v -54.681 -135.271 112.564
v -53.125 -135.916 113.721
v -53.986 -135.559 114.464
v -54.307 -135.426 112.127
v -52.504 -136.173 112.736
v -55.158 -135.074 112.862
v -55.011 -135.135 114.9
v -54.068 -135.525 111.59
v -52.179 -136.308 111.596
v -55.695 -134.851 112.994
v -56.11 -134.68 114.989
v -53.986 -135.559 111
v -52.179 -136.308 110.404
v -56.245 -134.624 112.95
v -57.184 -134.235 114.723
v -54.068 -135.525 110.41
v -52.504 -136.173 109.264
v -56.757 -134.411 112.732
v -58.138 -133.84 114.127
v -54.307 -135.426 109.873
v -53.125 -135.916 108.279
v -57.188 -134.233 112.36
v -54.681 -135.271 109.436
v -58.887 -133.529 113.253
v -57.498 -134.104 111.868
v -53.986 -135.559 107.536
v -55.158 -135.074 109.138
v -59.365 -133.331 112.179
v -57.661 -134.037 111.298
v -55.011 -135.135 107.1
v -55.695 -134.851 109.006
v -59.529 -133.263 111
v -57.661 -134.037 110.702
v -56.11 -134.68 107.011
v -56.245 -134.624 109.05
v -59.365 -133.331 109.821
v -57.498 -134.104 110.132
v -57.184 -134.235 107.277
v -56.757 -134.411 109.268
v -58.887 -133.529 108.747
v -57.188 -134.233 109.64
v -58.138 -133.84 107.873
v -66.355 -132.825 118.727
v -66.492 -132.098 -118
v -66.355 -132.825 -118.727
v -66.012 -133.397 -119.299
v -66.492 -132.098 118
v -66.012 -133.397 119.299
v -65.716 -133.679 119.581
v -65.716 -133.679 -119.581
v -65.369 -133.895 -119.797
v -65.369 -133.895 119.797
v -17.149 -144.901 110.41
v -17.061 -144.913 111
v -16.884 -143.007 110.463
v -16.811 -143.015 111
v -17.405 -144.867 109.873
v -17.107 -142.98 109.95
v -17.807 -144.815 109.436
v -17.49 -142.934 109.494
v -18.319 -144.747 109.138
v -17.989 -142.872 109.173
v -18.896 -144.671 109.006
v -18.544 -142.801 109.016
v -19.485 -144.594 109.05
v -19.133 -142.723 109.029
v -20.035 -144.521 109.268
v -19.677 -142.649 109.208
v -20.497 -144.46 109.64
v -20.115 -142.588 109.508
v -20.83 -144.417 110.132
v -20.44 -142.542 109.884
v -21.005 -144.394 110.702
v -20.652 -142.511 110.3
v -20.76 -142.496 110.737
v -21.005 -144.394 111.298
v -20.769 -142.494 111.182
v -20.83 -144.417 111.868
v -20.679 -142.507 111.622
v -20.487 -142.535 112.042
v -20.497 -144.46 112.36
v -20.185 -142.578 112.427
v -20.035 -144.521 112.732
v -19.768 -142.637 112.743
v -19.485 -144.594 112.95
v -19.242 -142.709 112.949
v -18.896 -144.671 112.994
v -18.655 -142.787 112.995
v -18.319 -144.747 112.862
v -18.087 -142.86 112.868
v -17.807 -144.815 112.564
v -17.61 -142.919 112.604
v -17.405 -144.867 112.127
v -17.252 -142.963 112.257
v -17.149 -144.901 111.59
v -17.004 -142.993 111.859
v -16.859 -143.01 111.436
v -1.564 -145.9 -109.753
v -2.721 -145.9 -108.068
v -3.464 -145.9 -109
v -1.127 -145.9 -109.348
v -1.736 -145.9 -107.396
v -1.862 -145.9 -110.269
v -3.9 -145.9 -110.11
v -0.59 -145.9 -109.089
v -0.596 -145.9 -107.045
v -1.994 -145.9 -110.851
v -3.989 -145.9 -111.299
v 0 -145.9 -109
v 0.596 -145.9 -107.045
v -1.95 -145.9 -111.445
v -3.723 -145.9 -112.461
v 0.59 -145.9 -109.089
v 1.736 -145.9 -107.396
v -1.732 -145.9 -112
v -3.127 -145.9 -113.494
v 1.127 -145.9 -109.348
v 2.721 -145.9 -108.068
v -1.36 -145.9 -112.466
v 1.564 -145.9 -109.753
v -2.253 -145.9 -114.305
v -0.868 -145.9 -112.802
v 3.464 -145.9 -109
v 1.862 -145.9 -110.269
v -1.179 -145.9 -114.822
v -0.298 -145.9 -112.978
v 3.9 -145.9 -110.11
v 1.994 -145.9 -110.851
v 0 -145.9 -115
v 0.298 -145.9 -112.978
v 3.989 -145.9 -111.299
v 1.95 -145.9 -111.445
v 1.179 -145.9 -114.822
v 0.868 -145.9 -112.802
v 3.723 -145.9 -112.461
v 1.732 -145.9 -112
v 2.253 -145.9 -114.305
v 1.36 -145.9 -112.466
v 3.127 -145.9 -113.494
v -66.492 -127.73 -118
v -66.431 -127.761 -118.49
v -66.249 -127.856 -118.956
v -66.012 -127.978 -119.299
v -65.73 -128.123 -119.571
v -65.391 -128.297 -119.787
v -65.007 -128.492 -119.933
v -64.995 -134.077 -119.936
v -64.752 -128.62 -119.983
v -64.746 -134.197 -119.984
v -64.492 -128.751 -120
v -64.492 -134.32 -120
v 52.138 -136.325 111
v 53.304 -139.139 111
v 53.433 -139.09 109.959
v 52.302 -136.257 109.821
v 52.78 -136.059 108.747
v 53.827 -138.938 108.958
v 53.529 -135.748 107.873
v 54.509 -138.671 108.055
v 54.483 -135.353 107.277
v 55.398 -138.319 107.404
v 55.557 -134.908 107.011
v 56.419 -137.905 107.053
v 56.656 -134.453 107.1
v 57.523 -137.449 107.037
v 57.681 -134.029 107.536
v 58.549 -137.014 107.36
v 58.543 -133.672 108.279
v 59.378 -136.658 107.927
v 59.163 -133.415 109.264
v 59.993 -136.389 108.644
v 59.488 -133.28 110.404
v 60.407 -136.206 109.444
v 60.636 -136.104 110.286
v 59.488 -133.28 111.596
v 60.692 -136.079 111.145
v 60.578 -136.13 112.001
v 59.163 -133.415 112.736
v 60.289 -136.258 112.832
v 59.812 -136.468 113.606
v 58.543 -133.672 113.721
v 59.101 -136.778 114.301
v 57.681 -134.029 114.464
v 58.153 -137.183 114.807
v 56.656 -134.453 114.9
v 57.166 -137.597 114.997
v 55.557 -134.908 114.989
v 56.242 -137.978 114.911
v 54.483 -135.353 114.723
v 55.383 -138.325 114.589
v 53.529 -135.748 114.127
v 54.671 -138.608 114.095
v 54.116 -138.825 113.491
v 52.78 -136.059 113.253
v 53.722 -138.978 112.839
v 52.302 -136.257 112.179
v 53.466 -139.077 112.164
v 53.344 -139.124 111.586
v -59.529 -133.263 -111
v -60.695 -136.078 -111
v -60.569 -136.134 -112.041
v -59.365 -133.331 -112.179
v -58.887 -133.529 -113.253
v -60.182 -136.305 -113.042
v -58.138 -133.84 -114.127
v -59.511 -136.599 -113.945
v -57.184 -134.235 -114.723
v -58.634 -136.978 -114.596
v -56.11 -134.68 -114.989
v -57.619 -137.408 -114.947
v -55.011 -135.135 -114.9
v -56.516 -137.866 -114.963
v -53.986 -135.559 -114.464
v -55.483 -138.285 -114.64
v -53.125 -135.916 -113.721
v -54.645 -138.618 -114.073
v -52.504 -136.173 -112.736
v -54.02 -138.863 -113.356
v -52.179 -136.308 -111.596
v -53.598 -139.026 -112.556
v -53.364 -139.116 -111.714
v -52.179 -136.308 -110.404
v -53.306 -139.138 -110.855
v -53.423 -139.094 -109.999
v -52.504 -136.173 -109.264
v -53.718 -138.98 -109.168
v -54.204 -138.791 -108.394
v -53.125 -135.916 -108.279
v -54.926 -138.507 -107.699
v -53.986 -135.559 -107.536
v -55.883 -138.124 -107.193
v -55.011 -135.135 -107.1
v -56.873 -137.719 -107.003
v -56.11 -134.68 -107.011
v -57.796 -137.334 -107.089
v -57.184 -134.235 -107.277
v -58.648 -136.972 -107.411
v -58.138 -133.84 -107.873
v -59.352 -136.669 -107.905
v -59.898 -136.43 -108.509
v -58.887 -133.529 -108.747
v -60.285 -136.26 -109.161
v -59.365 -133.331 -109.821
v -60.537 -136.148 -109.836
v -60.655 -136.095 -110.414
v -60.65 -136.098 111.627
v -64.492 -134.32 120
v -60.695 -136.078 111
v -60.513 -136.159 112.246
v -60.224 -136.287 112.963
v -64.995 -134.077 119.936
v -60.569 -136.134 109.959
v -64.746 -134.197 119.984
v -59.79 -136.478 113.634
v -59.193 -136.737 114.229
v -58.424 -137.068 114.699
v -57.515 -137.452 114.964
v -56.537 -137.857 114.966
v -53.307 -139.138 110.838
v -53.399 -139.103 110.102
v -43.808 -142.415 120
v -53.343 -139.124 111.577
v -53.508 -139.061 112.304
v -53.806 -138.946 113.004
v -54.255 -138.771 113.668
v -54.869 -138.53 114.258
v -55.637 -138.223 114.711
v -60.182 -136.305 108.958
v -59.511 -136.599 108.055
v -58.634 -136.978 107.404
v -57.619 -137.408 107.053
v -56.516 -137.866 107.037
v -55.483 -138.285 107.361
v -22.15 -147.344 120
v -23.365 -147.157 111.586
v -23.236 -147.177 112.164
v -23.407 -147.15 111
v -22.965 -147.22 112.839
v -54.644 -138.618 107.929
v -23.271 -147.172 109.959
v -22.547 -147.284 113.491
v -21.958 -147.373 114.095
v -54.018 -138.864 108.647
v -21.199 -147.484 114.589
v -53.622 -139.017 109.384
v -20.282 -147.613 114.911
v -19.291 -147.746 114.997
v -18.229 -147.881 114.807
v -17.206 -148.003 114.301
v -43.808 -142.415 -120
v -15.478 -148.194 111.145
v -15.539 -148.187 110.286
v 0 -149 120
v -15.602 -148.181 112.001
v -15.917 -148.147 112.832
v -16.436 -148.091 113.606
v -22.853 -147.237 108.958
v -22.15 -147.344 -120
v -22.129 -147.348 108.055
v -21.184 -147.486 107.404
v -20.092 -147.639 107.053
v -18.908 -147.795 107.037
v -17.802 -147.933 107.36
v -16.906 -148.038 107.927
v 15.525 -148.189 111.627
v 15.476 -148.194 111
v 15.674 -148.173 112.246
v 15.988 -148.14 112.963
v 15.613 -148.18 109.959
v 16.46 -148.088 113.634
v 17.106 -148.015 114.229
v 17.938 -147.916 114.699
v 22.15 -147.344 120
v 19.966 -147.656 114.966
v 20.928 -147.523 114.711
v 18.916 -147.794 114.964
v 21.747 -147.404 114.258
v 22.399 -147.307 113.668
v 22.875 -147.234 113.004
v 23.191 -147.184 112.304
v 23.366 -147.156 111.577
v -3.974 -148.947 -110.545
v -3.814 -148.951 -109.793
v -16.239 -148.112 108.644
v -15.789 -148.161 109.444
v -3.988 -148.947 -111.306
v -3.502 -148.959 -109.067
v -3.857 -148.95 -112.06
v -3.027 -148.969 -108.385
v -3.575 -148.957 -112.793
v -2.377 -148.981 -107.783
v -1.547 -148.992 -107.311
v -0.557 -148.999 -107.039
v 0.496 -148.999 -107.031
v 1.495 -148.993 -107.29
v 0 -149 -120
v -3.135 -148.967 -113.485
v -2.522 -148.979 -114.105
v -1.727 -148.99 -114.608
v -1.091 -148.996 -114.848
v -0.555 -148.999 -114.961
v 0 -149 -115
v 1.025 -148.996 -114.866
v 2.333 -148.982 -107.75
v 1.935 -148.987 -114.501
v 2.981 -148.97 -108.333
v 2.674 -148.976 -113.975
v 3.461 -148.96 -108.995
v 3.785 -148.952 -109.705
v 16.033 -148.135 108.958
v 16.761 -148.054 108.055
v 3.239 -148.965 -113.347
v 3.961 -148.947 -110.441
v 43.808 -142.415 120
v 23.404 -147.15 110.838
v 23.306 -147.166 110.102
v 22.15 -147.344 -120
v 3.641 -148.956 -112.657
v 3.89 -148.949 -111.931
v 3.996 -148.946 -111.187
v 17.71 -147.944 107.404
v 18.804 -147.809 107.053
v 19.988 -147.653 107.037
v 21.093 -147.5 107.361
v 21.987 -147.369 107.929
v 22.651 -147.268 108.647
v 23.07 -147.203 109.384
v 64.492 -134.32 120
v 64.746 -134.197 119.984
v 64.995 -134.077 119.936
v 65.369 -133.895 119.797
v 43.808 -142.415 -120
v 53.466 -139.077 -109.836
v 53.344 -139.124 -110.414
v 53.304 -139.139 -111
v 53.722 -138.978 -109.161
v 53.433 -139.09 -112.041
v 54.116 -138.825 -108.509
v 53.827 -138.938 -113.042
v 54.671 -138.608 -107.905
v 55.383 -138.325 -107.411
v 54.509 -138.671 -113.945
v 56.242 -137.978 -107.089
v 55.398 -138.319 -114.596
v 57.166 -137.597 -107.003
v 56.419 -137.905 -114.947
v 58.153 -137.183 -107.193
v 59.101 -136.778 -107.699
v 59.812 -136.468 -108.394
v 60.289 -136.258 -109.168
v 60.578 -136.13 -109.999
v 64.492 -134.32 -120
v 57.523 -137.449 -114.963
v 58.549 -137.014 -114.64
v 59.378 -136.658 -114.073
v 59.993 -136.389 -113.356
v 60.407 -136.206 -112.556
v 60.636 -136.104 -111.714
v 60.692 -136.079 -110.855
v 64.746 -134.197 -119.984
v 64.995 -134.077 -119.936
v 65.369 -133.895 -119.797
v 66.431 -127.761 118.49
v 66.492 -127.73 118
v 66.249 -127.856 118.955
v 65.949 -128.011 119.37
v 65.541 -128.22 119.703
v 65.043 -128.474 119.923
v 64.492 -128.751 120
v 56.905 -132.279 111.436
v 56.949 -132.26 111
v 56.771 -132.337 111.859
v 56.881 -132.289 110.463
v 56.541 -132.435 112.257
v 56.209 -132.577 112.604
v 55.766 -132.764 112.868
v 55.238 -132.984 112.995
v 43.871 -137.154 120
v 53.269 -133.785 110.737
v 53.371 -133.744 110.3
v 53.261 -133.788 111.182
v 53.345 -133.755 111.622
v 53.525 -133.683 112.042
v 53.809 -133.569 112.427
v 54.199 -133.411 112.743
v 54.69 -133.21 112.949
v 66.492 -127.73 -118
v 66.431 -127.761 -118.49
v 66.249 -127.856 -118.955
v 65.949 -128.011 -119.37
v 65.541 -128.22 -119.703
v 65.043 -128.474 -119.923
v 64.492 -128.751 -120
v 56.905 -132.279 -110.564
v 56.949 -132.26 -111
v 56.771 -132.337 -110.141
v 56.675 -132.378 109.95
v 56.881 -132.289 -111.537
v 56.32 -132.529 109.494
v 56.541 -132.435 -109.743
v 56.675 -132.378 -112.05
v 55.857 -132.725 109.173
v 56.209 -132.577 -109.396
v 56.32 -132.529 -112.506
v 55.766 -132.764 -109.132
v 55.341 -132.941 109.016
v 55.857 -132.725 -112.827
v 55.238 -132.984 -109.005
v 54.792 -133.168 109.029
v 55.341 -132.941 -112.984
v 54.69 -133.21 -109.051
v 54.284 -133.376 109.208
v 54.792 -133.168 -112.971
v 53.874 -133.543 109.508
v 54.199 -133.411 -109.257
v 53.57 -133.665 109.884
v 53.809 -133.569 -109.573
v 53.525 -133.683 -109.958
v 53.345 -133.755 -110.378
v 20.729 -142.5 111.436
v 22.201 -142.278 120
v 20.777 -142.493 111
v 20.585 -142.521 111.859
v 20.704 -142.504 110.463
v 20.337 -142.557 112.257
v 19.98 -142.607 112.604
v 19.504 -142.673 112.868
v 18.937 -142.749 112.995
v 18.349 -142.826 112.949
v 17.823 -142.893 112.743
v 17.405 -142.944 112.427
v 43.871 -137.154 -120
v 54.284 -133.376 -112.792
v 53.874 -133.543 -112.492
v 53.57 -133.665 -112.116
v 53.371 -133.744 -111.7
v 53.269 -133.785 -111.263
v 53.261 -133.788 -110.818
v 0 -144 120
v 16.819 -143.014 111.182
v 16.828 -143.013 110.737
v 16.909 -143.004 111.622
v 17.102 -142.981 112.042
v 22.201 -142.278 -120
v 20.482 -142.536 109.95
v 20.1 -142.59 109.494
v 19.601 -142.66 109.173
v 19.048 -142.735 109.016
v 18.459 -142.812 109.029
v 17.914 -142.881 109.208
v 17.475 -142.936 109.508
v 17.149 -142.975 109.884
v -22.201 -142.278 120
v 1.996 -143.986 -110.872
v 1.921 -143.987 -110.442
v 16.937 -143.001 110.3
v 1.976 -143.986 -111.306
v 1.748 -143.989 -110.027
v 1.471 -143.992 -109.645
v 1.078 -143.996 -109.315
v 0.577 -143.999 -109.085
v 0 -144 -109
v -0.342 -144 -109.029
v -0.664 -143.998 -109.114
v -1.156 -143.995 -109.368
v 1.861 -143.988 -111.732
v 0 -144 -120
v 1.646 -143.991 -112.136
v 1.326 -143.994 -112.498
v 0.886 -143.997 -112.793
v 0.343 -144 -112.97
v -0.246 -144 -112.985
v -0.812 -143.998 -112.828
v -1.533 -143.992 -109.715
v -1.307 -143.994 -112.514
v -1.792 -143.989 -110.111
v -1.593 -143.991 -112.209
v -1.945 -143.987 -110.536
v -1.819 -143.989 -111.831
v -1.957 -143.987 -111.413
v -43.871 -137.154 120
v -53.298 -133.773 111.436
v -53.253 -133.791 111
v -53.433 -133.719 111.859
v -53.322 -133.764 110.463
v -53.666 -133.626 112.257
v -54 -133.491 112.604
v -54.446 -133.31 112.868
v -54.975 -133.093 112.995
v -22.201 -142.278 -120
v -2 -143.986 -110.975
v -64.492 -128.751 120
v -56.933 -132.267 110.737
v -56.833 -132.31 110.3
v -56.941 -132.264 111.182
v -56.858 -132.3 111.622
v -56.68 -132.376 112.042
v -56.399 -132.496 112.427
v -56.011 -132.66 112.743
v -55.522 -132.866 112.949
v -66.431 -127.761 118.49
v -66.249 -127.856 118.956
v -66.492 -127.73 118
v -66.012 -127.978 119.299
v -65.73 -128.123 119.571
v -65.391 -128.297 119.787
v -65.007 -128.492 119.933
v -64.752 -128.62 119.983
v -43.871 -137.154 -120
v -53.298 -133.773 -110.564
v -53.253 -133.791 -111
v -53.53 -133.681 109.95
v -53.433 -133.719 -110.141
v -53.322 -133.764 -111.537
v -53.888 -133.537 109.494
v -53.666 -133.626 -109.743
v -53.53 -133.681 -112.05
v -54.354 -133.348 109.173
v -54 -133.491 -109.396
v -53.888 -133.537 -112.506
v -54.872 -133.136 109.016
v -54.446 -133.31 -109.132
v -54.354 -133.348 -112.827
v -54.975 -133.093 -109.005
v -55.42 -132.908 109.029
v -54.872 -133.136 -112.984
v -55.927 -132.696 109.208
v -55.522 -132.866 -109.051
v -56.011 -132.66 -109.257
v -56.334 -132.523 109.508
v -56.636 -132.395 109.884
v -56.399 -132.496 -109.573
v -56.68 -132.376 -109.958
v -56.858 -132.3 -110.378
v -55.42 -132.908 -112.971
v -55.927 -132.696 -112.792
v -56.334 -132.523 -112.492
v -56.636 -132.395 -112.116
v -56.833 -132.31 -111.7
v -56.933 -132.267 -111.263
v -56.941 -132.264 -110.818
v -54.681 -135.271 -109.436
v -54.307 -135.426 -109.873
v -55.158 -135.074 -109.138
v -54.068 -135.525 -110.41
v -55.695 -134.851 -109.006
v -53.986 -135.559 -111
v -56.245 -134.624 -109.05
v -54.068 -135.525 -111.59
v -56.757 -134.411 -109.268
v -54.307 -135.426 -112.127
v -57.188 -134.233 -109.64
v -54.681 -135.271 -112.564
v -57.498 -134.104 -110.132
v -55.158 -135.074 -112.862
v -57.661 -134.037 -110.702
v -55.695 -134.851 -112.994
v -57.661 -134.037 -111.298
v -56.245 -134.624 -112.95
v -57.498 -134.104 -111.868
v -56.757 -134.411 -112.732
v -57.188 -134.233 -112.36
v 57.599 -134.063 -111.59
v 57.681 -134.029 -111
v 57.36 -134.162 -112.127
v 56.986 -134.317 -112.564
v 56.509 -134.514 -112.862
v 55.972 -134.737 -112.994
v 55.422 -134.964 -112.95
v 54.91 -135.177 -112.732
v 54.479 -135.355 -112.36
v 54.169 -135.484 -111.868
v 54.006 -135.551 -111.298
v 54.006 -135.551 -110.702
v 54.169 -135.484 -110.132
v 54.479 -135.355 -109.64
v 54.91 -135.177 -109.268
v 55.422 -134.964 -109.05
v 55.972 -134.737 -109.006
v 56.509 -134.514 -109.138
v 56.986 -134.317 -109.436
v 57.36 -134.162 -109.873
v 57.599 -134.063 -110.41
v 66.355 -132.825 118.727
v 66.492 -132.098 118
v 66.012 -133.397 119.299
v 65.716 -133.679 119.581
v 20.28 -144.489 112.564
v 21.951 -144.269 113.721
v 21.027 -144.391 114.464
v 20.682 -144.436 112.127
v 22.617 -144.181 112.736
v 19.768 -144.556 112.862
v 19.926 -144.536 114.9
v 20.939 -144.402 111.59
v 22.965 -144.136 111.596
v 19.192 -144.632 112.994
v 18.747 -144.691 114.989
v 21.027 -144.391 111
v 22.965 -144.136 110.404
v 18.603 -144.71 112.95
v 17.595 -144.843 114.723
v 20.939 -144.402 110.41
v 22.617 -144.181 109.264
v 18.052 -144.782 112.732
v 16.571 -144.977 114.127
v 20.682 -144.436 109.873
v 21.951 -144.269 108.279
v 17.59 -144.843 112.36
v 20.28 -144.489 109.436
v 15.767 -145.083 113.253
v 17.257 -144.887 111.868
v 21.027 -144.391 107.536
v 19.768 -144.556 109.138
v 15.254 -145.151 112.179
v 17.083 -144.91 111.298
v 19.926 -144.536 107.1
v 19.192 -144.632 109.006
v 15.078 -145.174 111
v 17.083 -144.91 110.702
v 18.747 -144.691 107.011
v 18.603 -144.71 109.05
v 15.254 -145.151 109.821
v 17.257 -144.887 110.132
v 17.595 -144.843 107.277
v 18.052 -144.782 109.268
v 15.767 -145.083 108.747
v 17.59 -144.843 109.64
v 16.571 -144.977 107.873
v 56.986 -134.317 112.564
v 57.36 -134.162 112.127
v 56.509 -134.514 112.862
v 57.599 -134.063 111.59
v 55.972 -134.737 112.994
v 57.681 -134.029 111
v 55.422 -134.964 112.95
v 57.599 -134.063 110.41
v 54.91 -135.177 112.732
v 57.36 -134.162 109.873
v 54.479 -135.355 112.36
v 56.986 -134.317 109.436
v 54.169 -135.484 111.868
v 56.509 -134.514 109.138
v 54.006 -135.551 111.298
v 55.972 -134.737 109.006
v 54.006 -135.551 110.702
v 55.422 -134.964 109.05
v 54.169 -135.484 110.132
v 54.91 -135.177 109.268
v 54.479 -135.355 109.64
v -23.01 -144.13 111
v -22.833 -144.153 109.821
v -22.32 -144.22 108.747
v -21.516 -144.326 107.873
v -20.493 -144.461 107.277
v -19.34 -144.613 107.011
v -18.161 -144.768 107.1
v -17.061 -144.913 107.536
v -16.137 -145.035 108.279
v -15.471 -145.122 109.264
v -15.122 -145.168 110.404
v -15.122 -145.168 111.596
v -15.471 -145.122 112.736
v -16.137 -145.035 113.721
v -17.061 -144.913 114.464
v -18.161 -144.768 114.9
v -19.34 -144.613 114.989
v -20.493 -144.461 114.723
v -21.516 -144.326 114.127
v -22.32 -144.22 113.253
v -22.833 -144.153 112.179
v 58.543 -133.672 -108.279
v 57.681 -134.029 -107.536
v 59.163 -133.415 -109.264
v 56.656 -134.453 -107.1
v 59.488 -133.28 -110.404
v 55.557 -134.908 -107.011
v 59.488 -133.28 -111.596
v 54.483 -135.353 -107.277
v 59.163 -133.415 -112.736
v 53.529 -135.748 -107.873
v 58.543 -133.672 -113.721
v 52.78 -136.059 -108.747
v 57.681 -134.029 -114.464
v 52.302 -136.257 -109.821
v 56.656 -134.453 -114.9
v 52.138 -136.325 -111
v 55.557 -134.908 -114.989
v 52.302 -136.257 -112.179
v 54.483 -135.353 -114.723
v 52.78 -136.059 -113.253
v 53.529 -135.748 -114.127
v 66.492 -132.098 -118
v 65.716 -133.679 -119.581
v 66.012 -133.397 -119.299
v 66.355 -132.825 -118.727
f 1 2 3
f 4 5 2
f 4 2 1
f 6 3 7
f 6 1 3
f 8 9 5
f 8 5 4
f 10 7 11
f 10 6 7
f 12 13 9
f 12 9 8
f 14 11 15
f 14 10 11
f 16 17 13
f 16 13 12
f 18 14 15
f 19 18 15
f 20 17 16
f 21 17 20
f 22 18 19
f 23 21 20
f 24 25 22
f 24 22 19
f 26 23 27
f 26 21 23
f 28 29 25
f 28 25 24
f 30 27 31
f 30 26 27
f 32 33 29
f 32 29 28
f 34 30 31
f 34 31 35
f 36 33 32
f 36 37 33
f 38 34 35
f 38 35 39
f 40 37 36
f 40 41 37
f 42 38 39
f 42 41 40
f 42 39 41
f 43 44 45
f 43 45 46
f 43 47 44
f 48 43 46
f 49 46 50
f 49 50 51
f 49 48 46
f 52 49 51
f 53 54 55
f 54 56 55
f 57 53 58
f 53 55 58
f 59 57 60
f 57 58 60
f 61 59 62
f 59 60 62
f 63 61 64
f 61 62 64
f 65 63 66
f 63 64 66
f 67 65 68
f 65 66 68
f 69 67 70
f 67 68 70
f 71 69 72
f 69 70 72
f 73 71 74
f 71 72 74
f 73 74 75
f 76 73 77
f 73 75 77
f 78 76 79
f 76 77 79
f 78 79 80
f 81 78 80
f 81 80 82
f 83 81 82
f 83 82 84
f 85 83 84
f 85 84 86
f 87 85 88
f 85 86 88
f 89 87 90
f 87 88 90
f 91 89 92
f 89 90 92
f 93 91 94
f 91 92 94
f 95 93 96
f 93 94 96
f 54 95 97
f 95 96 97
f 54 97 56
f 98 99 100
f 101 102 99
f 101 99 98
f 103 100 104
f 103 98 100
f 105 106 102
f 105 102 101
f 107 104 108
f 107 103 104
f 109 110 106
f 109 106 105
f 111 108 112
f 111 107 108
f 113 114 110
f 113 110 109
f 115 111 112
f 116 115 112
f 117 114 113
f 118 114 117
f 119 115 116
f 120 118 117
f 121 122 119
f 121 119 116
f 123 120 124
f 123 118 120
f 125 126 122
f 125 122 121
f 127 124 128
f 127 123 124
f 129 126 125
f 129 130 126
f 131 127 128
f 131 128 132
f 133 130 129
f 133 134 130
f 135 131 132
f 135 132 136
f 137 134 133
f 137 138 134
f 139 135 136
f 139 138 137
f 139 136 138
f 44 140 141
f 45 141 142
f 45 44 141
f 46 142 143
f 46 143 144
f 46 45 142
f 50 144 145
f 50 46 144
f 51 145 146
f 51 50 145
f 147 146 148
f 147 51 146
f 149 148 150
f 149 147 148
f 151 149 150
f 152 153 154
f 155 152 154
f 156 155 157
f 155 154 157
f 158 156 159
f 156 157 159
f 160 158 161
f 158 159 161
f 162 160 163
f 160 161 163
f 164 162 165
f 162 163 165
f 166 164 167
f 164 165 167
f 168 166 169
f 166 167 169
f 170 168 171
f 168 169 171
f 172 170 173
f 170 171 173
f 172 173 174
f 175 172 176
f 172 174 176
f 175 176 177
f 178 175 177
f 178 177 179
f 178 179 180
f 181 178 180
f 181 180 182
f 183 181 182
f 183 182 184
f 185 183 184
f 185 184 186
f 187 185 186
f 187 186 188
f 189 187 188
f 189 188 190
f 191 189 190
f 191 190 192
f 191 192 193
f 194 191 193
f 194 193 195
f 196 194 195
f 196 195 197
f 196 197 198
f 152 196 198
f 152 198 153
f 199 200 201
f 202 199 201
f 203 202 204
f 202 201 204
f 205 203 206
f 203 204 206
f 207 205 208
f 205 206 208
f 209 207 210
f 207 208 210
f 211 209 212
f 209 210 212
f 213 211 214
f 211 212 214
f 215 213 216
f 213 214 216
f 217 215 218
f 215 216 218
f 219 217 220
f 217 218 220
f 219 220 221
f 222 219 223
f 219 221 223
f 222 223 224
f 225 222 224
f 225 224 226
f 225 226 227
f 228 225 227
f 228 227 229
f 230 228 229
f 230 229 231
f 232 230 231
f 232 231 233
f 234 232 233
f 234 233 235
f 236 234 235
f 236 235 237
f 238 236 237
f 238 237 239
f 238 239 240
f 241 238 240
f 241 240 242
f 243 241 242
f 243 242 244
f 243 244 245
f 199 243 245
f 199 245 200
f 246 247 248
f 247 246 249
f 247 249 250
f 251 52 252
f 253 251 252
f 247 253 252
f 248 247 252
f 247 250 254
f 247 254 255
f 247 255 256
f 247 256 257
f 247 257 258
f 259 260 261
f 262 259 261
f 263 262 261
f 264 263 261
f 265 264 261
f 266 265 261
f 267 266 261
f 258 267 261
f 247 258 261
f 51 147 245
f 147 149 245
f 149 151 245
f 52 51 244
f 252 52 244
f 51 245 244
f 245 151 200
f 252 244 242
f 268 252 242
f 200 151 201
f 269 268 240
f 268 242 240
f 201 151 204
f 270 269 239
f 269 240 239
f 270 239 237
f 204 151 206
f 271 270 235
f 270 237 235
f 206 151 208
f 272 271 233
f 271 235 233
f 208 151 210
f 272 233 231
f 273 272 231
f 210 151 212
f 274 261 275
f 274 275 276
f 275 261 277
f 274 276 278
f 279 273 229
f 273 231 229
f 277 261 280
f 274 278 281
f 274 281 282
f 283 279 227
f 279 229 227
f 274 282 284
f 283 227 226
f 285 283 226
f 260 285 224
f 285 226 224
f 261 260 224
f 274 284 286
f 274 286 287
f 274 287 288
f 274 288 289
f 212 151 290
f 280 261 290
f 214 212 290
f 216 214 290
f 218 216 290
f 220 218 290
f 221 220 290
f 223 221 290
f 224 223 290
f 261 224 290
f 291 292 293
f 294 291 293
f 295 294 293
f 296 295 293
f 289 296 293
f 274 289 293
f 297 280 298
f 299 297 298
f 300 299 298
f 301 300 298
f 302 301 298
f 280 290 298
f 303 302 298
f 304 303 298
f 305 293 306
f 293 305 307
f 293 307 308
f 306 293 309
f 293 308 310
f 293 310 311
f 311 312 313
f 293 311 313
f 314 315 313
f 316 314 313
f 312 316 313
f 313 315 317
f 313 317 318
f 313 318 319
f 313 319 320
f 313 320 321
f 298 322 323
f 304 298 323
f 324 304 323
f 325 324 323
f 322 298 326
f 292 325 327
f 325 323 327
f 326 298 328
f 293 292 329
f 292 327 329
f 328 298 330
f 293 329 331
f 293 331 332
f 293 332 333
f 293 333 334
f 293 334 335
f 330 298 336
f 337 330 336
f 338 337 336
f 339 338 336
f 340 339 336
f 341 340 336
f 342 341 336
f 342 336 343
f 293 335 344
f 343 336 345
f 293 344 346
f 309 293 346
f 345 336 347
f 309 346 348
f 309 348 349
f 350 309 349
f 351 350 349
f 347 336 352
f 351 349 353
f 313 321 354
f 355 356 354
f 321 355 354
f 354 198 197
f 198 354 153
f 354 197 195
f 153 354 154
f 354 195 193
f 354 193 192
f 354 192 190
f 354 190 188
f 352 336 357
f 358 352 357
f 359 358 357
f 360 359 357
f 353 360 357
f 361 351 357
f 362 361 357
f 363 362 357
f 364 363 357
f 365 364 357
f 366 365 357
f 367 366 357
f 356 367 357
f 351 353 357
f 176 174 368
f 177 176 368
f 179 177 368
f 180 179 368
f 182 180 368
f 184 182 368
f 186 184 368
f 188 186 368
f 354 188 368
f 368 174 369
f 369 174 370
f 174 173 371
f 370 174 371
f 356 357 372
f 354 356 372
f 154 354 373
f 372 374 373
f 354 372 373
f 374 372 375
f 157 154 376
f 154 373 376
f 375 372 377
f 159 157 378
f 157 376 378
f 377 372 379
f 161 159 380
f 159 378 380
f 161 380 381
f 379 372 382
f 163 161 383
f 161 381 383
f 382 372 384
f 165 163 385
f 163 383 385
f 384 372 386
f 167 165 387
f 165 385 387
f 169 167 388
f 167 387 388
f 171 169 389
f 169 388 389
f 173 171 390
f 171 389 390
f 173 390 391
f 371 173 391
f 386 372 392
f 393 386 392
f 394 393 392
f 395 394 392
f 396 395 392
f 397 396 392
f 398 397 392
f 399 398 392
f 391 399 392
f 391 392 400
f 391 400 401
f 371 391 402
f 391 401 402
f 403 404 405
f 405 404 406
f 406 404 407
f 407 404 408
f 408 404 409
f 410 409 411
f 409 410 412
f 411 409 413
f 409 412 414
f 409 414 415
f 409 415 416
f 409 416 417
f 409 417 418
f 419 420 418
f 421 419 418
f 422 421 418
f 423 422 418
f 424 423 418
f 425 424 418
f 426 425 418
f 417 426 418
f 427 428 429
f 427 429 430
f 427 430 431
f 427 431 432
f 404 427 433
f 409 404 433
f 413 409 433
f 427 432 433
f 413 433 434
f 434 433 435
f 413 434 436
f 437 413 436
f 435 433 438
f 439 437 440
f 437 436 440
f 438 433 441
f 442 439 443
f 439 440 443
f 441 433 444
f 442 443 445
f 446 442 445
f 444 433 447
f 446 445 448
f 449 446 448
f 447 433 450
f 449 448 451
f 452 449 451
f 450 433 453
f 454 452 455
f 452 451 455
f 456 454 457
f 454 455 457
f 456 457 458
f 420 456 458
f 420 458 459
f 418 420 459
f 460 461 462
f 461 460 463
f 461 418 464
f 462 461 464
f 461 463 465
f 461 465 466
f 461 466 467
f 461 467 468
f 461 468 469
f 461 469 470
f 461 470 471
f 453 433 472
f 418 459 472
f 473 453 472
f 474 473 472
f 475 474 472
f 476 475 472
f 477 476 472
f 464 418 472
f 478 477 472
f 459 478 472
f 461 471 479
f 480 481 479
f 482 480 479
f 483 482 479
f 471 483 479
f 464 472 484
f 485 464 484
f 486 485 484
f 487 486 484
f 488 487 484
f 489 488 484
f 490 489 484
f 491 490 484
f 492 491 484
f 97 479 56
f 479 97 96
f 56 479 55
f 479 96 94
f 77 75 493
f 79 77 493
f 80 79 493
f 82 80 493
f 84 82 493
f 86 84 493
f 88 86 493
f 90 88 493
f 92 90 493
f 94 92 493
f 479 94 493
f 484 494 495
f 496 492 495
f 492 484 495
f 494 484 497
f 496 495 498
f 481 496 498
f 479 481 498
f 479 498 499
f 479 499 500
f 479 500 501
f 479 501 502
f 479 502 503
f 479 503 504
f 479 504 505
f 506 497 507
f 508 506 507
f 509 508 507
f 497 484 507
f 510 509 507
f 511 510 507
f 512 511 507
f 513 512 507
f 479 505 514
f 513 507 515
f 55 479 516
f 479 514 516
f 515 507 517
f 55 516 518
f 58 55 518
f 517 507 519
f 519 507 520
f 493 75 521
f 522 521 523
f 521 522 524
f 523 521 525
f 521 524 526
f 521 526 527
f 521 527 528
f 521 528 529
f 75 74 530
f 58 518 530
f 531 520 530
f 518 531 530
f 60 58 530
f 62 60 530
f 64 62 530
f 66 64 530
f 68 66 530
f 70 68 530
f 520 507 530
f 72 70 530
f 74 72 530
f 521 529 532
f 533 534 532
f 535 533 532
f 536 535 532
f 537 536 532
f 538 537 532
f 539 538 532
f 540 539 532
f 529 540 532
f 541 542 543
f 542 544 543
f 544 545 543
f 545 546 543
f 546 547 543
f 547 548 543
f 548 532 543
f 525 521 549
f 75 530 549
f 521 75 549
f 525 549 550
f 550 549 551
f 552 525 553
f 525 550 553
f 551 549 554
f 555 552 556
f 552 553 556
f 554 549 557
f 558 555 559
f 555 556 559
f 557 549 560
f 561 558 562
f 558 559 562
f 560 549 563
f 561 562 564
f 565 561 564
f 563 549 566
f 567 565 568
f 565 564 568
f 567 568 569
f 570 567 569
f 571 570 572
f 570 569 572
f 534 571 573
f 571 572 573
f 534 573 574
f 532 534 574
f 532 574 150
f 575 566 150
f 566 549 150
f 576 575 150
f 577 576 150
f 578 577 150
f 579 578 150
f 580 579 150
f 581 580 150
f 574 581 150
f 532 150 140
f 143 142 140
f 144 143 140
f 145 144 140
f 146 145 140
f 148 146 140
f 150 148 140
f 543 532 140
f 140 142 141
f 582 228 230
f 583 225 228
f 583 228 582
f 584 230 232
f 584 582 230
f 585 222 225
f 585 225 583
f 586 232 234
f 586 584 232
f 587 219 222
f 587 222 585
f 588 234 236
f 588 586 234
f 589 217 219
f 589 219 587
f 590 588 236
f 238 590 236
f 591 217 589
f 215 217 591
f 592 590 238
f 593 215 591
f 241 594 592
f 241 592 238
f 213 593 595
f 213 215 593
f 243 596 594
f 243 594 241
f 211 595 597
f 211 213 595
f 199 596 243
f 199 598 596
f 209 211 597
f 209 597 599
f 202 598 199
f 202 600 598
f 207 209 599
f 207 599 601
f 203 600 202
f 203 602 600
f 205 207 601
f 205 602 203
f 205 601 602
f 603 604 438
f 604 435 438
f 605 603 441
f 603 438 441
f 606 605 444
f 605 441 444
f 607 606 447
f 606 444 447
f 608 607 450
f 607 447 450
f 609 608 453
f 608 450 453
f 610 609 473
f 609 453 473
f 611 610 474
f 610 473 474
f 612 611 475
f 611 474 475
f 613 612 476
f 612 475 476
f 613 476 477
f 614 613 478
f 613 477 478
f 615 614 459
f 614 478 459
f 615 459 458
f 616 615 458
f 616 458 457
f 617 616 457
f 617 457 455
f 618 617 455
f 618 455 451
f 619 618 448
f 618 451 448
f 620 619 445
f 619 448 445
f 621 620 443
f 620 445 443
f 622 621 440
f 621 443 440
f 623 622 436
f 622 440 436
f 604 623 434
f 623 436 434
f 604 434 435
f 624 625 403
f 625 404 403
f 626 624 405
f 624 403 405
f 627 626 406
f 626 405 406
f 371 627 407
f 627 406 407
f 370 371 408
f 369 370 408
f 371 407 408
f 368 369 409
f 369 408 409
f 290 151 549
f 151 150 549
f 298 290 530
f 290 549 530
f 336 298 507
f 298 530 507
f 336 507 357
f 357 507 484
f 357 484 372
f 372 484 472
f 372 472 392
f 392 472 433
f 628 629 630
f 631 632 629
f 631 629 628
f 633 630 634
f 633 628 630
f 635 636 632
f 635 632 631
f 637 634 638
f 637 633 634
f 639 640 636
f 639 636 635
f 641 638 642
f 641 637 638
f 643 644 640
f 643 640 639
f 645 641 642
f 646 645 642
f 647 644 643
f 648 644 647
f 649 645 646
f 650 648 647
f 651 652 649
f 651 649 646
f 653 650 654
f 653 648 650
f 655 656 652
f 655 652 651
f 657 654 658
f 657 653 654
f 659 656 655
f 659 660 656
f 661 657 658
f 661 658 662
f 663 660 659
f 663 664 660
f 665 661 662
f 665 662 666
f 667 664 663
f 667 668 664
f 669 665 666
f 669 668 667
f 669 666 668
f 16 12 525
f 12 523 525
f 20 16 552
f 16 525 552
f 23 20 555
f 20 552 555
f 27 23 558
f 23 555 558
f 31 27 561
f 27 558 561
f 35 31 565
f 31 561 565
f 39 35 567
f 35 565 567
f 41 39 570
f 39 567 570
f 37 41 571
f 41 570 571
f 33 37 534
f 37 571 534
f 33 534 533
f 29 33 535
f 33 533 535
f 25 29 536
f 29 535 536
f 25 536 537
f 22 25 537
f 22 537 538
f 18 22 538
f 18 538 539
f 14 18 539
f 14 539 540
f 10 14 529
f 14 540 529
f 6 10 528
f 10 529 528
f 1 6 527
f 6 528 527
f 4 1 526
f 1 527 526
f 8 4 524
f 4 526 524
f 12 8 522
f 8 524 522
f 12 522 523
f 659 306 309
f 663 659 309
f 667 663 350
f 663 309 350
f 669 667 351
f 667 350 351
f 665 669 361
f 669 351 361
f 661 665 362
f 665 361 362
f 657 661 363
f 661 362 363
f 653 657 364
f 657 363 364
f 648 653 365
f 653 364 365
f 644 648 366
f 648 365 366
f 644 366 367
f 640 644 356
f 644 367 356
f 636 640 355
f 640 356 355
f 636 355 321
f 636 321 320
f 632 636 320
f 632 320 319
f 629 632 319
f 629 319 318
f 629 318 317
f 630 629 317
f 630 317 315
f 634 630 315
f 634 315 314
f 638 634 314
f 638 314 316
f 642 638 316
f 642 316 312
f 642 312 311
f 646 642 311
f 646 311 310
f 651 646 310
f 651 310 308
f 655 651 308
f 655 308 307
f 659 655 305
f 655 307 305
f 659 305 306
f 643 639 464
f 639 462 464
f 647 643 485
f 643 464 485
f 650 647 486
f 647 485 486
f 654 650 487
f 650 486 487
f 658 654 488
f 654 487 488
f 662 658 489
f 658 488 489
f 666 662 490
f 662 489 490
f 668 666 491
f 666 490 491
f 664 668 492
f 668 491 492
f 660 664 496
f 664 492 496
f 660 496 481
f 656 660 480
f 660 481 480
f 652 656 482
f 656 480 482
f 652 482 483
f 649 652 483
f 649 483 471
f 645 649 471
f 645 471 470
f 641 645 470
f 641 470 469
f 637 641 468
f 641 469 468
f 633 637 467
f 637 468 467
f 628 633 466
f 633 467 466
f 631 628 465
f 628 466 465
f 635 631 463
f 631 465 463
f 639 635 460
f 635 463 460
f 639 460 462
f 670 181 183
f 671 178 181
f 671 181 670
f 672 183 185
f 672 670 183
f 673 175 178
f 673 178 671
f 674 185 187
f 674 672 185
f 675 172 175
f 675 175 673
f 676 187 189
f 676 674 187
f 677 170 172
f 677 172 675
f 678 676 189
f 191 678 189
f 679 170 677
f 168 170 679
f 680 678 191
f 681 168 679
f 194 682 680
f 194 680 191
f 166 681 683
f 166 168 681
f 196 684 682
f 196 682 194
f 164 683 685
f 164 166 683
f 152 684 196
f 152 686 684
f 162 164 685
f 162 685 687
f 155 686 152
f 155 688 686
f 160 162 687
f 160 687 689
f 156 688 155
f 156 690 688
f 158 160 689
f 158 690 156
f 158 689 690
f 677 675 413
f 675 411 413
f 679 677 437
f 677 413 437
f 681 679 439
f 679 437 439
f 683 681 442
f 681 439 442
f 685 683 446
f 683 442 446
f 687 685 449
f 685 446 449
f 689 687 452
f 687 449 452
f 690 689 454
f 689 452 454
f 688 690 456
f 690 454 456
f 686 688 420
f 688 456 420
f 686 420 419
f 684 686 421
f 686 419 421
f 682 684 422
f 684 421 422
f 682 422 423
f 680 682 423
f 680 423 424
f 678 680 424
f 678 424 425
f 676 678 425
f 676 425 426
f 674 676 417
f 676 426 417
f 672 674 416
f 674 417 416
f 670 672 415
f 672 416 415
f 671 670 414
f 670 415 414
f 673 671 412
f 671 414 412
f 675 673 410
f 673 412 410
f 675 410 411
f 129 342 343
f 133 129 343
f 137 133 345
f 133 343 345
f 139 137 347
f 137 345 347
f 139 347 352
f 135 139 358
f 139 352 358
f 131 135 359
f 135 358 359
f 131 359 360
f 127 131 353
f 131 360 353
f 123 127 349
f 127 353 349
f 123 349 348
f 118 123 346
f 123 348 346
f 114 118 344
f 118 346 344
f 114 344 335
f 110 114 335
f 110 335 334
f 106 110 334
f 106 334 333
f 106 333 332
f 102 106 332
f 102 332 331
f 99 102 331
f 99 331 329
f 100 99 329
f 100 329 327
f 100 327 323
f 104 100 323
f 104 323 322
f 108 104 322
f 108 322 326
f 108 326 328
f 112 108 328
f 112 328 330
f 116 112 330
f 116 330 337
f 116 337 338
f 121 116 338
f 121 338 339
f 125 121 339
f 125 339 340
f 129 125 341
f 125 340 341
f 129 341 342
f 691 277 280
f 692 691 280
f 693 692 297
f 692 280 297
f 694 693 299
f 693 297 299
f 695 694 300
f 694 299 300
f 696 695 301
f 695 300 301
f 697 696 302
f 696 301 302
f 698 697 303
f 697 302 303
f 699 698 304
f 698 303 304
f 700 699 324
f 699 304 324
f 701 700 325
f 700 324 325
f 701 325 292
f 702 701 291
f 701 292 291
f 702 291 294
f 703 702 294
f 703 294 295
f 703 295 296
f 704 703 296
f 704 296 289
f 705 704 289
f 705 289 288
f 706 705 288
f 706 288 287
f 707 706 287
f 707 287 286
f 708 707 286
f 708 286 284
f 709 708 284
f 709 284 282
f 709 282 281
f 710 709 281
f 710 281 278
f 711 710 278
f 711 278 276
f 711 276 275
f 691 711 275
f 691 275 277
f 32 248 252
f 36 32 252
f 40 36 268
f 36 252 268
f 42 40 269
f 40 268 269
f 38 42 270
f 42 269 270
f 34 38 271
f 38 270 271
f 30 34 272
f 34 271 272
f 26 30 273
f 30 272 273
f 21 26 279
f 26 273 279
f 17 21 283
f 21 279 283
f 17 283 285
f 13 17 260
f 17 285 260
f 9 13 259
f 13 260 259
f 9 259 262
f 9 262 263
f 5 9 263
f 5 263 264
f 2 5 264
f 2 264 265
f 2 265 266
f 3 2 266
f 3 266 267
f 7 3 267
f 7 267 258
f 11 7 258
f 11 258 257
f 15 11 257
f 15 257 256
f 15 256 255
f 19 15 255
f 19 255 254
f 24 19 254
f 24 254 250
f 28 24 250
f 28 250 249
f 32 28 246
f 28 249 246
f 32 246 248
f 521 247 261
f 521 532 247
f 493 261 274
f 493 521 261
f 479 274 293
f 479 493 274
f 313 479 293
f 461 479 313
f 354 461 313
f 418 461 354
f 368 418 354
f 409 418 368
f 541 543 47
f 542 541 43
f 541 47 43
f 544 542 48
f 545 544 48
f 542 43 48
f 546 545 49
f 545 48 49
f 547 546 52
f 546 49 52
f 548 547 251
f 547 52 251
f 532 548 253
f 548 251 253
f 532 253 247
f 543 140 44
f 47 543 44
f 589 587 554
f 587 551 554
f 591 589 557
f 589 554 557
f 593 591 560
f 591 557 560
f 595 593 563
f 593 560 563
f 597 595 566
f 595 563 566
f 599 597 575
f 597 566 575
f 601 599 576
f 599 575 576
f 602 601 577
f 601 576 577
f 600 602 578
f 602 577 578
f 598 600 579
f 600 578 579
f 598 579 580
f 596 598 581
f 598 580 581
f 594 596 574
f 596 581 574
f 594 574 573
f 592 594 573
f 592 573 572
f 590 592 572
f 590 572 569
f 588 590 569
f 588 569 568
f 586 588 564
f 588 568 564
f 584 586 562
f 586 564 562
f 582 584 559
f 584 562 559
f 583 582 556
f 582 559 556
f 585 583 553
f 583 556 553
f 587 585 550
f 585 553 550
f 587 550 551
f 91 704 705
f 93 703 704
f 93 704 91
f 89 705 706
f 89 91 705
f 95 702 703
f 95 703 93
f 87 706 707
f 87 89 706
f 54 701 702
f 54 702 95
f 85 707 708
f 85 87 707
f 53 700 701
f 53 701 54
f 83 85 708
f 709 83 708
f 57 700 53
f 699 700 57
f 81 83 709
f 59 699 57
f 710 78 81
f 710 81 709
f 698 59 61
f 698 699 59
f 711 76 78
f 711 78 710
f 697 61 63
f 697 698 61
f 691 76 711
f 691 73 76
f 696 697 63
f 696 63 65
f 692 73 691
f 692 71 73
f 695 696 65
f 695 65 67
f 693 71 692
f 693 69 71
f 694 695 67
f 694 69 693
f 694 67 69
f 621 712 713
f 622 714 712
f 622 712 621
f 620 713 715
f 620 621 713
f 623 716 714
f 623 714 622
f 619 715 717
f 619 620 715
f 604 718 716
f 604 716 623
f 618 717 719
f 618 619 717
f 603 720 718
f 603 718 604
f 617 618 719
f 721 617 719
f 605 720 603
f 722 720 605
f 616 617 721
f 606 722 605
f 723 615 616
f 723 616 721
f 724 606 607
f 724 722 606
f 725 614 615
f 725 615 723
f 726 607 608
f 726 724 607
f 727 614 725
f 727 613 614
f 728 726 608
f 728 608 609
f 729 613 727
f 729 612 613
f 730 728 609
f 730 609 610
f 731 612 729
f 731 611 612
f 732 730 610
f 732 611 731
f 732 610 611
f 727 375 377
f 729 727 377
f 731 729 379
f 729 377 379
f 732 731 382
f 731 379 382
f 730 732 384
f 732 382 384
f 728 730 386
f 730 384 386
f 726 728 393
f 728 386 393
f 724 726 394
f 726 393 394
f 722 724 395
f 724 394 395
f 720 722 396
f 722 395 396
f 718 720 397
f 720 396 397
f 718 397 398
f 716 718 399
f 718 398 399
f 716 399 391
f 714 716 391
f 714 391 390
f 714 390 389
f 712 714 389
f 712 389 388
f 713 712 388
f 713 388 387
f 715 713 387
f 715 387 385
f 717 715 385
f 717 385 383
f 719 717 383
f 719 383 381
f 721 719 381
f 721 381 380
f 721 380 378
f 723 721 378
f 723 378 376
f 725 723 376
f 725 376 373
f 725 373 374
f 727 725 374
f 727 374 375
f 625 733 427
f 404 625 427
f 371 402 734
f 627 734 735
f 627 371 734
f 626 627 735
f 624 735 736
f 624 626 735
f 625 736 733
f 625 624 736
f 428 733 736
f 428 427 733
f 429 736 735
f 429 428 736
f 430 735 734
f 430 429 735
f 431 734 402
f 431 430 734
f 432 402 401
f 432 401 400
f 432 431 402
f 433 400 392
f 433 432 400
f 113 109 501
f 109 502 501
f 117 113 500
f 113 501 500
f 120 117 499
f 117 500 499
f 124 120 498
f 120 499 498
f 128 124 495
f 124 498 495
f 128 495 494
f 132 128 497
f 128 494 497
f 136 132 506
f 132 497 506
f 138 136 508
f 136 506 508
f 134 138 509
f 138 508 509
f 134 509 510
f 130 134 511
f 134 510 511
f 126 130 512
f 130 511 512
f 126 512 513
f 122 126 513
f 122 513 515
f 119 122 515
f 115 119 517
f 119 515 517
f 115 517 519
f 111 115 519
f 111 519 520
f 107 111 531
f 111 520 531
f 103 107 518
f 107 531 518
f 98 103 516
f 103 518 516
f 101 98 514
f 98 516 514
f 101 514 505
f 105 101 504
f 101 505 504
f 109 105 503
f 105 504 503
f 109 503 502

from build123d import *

# Parameters (mm, degrees)
BOSS_EXTRUDE1_DEPTH         = 120
BOSS_EXTRUDE1_DEPTH_BACK    = 120
FILLET1_R                   = 2
HOLE1_D                     = 4
HOLE1_CBORE_D               = 8
HOLE1_CBORE_DEPTH           = 3.1
HOLE1_ON_FACE_2_D           = 4
HOLE1_ON_FACE_2_CBORE_D     = 8
HOLE1_ON_FACE_2_CBORE_DEPTH = 3.1
HOLE1_ON_FACE_3_D           = 4
HOLE1_ON_FACE_3_CBORE_D     = 8
HOLE1_ON_FACE_3_CBORE_DEPTH = 3.1
HOLE1_ON_FACE_4_D           = 4
HOLE1_ON_FACE_4_CBORE_D     = 8
HOLE1_ON_FACE_4_CBORE_DEPTH = 3.1
HOLE1_ON_FACE_5_D           = 4
HOLE1_ON_FACE_5_CBORE_D     = 8
HOLE1_ON_FACE_5_CBORE_DEPTH = 3.1
HOLE1_ON_FACE_6_D           = 4
HOLE1_ON_FACE_6_CBORE_D     = 8
HOLE1_ON_FACE_6_CBORE_DEPTH = 3.1


with BuildPart() as part:
    # Sketch1 → Boss-Extrude1 (new, two sides: drawn at the far end of the back side and taken through both)
    with BuildSketch(Plane.XY.offset(-BOSS_EXTRUDE1_DEPTH_BACK)):
        with BuildLine():
            Line((-66.491800306, -127.729559978), (-66.491800306, -133.341068288))
            ThreePointArc((-66.491800306, -133.341068288), (0, -149), (66.491800306, -133.341068288))
            Line((66.491800306, -133.341068288), (66.491800306, -127.729559978))
            ThreePointArc((66.491800306, -127.729559978), (0, -144), (-66.491800306, -127.729559978))
        make_face()
    extrude(amount=BOSS_EXTRUDE1_DEPTH + BOSS_EXTRUDE1_DEPTH_BACK)

    # Fillet1
    fillet1_edges = [part.edges().sort_by_distance(p)[0] for p in [
        (-66.491800306, -130.535314133, 120),
        (66.491800306, -130.535314133, -120),
        (66.491800306, -130.535314133, 120),
        (-66.491800306, -130.535314133, -120),
        (66.491800306, -133.341068288, 0),
        (-66.491800306, -133.341068288, 0),
    ]]
    fillet(fillet1_edges, radius=FILLET1_R)

    # Hole1 (through all)
    with Locations(Plane(origin=(-57.019831422, -137.658050344, 111), x_dir=(-0.923879532511, 0.382683432365, 0), z_dir=(-0.382683432365, -0.923879532511, 0))):
        with Locations((0, 0)):
            CounterBoreHole(HOLE1_D / 2, HOLE1_CBORE_D / 2, HOLE1_CBORE_DEPTH)

    # Hole1 on face 2 (through all)
    with Locations(Plane(origin=(-19.448402641, -147.725284345, 111), x_dir=(-0.991444888611, 0.130525985335, 0), z_dir=(-0.130525985335, -0.991444888611, 0))):
        with Locations((0, 0)):
            CounterBoreHole(HOLE1_ON_FACE_2_D / 2, HOLE1_ON_FACE_2_CBORE_D / 2, HOLE1_ON_FACE_2_CBORE_DEPTH)

    # Hole1 on face 3 (through all)
    with Locations(Plane(origin=(19.448402641, -147.725284345, 111), x_dir=(-0.991444888611, -0.130525985335, 0), z_dir=(0.130525985335, -0.991444888611, 0))):
        with Locations((0, 0)):
            CounterBoreHole(HOLE1_ON_FACE_3_D / 2, HOLE1_ON_FACE_3_CBORE_D / 2, HOLE1_ON_FACE_3_CBORE_DEPTH)

    # Hole1 on face 4 (through all)
    with Locations(Plane(origin=(-57.019831422, -137.658050344, -111), x_dir=(-0.923879753837, 0.382682898036, 0), z_dir=(-0.382682898036, -0.923879753837, 0))):
        with Locations((0, 0)):
            CounterBoreHole(HOLE1_ON_FACE_4_D / 2, HOLE1_ON_FACE_4_CBORE_D / 2, HOLE1_ON_FACE_4_CBORE_DEPTH)

    # Hole1 on face 5 (through all)
    with Locations(Plane(origin=(0, -149, -111), x_dir=(0, 0, -1), z_dir=(0, -1, 0))):
        with Locations((0, 0)):
            CounterBoreHole(HOLE1_ON_FACE_5_D / 2, HOLE1_ON_FACE_5_CBORE_D / 2, HOLE1_ON_FACE_5_CBORE_DEPTH)

    # Hole1 on face 6 (through all)
    with Locations(Plane(origin=(57.019831422, -137.658050344, -111), x_dir=(-0.923879753837, -0.382682898036, 0), z_dir=(0.382682898036, -0.923879753837, 0))):
        with Locations((0, 0), (0, -222)):
            CounterBoreHole(HOLE1_ON_FACE_6_D / 2, HOLE1_ON_FACE_6_CBORE_D / 2, HOLE1_ON_FACE_6_CBORE_DEPTH)


solid = part.part
